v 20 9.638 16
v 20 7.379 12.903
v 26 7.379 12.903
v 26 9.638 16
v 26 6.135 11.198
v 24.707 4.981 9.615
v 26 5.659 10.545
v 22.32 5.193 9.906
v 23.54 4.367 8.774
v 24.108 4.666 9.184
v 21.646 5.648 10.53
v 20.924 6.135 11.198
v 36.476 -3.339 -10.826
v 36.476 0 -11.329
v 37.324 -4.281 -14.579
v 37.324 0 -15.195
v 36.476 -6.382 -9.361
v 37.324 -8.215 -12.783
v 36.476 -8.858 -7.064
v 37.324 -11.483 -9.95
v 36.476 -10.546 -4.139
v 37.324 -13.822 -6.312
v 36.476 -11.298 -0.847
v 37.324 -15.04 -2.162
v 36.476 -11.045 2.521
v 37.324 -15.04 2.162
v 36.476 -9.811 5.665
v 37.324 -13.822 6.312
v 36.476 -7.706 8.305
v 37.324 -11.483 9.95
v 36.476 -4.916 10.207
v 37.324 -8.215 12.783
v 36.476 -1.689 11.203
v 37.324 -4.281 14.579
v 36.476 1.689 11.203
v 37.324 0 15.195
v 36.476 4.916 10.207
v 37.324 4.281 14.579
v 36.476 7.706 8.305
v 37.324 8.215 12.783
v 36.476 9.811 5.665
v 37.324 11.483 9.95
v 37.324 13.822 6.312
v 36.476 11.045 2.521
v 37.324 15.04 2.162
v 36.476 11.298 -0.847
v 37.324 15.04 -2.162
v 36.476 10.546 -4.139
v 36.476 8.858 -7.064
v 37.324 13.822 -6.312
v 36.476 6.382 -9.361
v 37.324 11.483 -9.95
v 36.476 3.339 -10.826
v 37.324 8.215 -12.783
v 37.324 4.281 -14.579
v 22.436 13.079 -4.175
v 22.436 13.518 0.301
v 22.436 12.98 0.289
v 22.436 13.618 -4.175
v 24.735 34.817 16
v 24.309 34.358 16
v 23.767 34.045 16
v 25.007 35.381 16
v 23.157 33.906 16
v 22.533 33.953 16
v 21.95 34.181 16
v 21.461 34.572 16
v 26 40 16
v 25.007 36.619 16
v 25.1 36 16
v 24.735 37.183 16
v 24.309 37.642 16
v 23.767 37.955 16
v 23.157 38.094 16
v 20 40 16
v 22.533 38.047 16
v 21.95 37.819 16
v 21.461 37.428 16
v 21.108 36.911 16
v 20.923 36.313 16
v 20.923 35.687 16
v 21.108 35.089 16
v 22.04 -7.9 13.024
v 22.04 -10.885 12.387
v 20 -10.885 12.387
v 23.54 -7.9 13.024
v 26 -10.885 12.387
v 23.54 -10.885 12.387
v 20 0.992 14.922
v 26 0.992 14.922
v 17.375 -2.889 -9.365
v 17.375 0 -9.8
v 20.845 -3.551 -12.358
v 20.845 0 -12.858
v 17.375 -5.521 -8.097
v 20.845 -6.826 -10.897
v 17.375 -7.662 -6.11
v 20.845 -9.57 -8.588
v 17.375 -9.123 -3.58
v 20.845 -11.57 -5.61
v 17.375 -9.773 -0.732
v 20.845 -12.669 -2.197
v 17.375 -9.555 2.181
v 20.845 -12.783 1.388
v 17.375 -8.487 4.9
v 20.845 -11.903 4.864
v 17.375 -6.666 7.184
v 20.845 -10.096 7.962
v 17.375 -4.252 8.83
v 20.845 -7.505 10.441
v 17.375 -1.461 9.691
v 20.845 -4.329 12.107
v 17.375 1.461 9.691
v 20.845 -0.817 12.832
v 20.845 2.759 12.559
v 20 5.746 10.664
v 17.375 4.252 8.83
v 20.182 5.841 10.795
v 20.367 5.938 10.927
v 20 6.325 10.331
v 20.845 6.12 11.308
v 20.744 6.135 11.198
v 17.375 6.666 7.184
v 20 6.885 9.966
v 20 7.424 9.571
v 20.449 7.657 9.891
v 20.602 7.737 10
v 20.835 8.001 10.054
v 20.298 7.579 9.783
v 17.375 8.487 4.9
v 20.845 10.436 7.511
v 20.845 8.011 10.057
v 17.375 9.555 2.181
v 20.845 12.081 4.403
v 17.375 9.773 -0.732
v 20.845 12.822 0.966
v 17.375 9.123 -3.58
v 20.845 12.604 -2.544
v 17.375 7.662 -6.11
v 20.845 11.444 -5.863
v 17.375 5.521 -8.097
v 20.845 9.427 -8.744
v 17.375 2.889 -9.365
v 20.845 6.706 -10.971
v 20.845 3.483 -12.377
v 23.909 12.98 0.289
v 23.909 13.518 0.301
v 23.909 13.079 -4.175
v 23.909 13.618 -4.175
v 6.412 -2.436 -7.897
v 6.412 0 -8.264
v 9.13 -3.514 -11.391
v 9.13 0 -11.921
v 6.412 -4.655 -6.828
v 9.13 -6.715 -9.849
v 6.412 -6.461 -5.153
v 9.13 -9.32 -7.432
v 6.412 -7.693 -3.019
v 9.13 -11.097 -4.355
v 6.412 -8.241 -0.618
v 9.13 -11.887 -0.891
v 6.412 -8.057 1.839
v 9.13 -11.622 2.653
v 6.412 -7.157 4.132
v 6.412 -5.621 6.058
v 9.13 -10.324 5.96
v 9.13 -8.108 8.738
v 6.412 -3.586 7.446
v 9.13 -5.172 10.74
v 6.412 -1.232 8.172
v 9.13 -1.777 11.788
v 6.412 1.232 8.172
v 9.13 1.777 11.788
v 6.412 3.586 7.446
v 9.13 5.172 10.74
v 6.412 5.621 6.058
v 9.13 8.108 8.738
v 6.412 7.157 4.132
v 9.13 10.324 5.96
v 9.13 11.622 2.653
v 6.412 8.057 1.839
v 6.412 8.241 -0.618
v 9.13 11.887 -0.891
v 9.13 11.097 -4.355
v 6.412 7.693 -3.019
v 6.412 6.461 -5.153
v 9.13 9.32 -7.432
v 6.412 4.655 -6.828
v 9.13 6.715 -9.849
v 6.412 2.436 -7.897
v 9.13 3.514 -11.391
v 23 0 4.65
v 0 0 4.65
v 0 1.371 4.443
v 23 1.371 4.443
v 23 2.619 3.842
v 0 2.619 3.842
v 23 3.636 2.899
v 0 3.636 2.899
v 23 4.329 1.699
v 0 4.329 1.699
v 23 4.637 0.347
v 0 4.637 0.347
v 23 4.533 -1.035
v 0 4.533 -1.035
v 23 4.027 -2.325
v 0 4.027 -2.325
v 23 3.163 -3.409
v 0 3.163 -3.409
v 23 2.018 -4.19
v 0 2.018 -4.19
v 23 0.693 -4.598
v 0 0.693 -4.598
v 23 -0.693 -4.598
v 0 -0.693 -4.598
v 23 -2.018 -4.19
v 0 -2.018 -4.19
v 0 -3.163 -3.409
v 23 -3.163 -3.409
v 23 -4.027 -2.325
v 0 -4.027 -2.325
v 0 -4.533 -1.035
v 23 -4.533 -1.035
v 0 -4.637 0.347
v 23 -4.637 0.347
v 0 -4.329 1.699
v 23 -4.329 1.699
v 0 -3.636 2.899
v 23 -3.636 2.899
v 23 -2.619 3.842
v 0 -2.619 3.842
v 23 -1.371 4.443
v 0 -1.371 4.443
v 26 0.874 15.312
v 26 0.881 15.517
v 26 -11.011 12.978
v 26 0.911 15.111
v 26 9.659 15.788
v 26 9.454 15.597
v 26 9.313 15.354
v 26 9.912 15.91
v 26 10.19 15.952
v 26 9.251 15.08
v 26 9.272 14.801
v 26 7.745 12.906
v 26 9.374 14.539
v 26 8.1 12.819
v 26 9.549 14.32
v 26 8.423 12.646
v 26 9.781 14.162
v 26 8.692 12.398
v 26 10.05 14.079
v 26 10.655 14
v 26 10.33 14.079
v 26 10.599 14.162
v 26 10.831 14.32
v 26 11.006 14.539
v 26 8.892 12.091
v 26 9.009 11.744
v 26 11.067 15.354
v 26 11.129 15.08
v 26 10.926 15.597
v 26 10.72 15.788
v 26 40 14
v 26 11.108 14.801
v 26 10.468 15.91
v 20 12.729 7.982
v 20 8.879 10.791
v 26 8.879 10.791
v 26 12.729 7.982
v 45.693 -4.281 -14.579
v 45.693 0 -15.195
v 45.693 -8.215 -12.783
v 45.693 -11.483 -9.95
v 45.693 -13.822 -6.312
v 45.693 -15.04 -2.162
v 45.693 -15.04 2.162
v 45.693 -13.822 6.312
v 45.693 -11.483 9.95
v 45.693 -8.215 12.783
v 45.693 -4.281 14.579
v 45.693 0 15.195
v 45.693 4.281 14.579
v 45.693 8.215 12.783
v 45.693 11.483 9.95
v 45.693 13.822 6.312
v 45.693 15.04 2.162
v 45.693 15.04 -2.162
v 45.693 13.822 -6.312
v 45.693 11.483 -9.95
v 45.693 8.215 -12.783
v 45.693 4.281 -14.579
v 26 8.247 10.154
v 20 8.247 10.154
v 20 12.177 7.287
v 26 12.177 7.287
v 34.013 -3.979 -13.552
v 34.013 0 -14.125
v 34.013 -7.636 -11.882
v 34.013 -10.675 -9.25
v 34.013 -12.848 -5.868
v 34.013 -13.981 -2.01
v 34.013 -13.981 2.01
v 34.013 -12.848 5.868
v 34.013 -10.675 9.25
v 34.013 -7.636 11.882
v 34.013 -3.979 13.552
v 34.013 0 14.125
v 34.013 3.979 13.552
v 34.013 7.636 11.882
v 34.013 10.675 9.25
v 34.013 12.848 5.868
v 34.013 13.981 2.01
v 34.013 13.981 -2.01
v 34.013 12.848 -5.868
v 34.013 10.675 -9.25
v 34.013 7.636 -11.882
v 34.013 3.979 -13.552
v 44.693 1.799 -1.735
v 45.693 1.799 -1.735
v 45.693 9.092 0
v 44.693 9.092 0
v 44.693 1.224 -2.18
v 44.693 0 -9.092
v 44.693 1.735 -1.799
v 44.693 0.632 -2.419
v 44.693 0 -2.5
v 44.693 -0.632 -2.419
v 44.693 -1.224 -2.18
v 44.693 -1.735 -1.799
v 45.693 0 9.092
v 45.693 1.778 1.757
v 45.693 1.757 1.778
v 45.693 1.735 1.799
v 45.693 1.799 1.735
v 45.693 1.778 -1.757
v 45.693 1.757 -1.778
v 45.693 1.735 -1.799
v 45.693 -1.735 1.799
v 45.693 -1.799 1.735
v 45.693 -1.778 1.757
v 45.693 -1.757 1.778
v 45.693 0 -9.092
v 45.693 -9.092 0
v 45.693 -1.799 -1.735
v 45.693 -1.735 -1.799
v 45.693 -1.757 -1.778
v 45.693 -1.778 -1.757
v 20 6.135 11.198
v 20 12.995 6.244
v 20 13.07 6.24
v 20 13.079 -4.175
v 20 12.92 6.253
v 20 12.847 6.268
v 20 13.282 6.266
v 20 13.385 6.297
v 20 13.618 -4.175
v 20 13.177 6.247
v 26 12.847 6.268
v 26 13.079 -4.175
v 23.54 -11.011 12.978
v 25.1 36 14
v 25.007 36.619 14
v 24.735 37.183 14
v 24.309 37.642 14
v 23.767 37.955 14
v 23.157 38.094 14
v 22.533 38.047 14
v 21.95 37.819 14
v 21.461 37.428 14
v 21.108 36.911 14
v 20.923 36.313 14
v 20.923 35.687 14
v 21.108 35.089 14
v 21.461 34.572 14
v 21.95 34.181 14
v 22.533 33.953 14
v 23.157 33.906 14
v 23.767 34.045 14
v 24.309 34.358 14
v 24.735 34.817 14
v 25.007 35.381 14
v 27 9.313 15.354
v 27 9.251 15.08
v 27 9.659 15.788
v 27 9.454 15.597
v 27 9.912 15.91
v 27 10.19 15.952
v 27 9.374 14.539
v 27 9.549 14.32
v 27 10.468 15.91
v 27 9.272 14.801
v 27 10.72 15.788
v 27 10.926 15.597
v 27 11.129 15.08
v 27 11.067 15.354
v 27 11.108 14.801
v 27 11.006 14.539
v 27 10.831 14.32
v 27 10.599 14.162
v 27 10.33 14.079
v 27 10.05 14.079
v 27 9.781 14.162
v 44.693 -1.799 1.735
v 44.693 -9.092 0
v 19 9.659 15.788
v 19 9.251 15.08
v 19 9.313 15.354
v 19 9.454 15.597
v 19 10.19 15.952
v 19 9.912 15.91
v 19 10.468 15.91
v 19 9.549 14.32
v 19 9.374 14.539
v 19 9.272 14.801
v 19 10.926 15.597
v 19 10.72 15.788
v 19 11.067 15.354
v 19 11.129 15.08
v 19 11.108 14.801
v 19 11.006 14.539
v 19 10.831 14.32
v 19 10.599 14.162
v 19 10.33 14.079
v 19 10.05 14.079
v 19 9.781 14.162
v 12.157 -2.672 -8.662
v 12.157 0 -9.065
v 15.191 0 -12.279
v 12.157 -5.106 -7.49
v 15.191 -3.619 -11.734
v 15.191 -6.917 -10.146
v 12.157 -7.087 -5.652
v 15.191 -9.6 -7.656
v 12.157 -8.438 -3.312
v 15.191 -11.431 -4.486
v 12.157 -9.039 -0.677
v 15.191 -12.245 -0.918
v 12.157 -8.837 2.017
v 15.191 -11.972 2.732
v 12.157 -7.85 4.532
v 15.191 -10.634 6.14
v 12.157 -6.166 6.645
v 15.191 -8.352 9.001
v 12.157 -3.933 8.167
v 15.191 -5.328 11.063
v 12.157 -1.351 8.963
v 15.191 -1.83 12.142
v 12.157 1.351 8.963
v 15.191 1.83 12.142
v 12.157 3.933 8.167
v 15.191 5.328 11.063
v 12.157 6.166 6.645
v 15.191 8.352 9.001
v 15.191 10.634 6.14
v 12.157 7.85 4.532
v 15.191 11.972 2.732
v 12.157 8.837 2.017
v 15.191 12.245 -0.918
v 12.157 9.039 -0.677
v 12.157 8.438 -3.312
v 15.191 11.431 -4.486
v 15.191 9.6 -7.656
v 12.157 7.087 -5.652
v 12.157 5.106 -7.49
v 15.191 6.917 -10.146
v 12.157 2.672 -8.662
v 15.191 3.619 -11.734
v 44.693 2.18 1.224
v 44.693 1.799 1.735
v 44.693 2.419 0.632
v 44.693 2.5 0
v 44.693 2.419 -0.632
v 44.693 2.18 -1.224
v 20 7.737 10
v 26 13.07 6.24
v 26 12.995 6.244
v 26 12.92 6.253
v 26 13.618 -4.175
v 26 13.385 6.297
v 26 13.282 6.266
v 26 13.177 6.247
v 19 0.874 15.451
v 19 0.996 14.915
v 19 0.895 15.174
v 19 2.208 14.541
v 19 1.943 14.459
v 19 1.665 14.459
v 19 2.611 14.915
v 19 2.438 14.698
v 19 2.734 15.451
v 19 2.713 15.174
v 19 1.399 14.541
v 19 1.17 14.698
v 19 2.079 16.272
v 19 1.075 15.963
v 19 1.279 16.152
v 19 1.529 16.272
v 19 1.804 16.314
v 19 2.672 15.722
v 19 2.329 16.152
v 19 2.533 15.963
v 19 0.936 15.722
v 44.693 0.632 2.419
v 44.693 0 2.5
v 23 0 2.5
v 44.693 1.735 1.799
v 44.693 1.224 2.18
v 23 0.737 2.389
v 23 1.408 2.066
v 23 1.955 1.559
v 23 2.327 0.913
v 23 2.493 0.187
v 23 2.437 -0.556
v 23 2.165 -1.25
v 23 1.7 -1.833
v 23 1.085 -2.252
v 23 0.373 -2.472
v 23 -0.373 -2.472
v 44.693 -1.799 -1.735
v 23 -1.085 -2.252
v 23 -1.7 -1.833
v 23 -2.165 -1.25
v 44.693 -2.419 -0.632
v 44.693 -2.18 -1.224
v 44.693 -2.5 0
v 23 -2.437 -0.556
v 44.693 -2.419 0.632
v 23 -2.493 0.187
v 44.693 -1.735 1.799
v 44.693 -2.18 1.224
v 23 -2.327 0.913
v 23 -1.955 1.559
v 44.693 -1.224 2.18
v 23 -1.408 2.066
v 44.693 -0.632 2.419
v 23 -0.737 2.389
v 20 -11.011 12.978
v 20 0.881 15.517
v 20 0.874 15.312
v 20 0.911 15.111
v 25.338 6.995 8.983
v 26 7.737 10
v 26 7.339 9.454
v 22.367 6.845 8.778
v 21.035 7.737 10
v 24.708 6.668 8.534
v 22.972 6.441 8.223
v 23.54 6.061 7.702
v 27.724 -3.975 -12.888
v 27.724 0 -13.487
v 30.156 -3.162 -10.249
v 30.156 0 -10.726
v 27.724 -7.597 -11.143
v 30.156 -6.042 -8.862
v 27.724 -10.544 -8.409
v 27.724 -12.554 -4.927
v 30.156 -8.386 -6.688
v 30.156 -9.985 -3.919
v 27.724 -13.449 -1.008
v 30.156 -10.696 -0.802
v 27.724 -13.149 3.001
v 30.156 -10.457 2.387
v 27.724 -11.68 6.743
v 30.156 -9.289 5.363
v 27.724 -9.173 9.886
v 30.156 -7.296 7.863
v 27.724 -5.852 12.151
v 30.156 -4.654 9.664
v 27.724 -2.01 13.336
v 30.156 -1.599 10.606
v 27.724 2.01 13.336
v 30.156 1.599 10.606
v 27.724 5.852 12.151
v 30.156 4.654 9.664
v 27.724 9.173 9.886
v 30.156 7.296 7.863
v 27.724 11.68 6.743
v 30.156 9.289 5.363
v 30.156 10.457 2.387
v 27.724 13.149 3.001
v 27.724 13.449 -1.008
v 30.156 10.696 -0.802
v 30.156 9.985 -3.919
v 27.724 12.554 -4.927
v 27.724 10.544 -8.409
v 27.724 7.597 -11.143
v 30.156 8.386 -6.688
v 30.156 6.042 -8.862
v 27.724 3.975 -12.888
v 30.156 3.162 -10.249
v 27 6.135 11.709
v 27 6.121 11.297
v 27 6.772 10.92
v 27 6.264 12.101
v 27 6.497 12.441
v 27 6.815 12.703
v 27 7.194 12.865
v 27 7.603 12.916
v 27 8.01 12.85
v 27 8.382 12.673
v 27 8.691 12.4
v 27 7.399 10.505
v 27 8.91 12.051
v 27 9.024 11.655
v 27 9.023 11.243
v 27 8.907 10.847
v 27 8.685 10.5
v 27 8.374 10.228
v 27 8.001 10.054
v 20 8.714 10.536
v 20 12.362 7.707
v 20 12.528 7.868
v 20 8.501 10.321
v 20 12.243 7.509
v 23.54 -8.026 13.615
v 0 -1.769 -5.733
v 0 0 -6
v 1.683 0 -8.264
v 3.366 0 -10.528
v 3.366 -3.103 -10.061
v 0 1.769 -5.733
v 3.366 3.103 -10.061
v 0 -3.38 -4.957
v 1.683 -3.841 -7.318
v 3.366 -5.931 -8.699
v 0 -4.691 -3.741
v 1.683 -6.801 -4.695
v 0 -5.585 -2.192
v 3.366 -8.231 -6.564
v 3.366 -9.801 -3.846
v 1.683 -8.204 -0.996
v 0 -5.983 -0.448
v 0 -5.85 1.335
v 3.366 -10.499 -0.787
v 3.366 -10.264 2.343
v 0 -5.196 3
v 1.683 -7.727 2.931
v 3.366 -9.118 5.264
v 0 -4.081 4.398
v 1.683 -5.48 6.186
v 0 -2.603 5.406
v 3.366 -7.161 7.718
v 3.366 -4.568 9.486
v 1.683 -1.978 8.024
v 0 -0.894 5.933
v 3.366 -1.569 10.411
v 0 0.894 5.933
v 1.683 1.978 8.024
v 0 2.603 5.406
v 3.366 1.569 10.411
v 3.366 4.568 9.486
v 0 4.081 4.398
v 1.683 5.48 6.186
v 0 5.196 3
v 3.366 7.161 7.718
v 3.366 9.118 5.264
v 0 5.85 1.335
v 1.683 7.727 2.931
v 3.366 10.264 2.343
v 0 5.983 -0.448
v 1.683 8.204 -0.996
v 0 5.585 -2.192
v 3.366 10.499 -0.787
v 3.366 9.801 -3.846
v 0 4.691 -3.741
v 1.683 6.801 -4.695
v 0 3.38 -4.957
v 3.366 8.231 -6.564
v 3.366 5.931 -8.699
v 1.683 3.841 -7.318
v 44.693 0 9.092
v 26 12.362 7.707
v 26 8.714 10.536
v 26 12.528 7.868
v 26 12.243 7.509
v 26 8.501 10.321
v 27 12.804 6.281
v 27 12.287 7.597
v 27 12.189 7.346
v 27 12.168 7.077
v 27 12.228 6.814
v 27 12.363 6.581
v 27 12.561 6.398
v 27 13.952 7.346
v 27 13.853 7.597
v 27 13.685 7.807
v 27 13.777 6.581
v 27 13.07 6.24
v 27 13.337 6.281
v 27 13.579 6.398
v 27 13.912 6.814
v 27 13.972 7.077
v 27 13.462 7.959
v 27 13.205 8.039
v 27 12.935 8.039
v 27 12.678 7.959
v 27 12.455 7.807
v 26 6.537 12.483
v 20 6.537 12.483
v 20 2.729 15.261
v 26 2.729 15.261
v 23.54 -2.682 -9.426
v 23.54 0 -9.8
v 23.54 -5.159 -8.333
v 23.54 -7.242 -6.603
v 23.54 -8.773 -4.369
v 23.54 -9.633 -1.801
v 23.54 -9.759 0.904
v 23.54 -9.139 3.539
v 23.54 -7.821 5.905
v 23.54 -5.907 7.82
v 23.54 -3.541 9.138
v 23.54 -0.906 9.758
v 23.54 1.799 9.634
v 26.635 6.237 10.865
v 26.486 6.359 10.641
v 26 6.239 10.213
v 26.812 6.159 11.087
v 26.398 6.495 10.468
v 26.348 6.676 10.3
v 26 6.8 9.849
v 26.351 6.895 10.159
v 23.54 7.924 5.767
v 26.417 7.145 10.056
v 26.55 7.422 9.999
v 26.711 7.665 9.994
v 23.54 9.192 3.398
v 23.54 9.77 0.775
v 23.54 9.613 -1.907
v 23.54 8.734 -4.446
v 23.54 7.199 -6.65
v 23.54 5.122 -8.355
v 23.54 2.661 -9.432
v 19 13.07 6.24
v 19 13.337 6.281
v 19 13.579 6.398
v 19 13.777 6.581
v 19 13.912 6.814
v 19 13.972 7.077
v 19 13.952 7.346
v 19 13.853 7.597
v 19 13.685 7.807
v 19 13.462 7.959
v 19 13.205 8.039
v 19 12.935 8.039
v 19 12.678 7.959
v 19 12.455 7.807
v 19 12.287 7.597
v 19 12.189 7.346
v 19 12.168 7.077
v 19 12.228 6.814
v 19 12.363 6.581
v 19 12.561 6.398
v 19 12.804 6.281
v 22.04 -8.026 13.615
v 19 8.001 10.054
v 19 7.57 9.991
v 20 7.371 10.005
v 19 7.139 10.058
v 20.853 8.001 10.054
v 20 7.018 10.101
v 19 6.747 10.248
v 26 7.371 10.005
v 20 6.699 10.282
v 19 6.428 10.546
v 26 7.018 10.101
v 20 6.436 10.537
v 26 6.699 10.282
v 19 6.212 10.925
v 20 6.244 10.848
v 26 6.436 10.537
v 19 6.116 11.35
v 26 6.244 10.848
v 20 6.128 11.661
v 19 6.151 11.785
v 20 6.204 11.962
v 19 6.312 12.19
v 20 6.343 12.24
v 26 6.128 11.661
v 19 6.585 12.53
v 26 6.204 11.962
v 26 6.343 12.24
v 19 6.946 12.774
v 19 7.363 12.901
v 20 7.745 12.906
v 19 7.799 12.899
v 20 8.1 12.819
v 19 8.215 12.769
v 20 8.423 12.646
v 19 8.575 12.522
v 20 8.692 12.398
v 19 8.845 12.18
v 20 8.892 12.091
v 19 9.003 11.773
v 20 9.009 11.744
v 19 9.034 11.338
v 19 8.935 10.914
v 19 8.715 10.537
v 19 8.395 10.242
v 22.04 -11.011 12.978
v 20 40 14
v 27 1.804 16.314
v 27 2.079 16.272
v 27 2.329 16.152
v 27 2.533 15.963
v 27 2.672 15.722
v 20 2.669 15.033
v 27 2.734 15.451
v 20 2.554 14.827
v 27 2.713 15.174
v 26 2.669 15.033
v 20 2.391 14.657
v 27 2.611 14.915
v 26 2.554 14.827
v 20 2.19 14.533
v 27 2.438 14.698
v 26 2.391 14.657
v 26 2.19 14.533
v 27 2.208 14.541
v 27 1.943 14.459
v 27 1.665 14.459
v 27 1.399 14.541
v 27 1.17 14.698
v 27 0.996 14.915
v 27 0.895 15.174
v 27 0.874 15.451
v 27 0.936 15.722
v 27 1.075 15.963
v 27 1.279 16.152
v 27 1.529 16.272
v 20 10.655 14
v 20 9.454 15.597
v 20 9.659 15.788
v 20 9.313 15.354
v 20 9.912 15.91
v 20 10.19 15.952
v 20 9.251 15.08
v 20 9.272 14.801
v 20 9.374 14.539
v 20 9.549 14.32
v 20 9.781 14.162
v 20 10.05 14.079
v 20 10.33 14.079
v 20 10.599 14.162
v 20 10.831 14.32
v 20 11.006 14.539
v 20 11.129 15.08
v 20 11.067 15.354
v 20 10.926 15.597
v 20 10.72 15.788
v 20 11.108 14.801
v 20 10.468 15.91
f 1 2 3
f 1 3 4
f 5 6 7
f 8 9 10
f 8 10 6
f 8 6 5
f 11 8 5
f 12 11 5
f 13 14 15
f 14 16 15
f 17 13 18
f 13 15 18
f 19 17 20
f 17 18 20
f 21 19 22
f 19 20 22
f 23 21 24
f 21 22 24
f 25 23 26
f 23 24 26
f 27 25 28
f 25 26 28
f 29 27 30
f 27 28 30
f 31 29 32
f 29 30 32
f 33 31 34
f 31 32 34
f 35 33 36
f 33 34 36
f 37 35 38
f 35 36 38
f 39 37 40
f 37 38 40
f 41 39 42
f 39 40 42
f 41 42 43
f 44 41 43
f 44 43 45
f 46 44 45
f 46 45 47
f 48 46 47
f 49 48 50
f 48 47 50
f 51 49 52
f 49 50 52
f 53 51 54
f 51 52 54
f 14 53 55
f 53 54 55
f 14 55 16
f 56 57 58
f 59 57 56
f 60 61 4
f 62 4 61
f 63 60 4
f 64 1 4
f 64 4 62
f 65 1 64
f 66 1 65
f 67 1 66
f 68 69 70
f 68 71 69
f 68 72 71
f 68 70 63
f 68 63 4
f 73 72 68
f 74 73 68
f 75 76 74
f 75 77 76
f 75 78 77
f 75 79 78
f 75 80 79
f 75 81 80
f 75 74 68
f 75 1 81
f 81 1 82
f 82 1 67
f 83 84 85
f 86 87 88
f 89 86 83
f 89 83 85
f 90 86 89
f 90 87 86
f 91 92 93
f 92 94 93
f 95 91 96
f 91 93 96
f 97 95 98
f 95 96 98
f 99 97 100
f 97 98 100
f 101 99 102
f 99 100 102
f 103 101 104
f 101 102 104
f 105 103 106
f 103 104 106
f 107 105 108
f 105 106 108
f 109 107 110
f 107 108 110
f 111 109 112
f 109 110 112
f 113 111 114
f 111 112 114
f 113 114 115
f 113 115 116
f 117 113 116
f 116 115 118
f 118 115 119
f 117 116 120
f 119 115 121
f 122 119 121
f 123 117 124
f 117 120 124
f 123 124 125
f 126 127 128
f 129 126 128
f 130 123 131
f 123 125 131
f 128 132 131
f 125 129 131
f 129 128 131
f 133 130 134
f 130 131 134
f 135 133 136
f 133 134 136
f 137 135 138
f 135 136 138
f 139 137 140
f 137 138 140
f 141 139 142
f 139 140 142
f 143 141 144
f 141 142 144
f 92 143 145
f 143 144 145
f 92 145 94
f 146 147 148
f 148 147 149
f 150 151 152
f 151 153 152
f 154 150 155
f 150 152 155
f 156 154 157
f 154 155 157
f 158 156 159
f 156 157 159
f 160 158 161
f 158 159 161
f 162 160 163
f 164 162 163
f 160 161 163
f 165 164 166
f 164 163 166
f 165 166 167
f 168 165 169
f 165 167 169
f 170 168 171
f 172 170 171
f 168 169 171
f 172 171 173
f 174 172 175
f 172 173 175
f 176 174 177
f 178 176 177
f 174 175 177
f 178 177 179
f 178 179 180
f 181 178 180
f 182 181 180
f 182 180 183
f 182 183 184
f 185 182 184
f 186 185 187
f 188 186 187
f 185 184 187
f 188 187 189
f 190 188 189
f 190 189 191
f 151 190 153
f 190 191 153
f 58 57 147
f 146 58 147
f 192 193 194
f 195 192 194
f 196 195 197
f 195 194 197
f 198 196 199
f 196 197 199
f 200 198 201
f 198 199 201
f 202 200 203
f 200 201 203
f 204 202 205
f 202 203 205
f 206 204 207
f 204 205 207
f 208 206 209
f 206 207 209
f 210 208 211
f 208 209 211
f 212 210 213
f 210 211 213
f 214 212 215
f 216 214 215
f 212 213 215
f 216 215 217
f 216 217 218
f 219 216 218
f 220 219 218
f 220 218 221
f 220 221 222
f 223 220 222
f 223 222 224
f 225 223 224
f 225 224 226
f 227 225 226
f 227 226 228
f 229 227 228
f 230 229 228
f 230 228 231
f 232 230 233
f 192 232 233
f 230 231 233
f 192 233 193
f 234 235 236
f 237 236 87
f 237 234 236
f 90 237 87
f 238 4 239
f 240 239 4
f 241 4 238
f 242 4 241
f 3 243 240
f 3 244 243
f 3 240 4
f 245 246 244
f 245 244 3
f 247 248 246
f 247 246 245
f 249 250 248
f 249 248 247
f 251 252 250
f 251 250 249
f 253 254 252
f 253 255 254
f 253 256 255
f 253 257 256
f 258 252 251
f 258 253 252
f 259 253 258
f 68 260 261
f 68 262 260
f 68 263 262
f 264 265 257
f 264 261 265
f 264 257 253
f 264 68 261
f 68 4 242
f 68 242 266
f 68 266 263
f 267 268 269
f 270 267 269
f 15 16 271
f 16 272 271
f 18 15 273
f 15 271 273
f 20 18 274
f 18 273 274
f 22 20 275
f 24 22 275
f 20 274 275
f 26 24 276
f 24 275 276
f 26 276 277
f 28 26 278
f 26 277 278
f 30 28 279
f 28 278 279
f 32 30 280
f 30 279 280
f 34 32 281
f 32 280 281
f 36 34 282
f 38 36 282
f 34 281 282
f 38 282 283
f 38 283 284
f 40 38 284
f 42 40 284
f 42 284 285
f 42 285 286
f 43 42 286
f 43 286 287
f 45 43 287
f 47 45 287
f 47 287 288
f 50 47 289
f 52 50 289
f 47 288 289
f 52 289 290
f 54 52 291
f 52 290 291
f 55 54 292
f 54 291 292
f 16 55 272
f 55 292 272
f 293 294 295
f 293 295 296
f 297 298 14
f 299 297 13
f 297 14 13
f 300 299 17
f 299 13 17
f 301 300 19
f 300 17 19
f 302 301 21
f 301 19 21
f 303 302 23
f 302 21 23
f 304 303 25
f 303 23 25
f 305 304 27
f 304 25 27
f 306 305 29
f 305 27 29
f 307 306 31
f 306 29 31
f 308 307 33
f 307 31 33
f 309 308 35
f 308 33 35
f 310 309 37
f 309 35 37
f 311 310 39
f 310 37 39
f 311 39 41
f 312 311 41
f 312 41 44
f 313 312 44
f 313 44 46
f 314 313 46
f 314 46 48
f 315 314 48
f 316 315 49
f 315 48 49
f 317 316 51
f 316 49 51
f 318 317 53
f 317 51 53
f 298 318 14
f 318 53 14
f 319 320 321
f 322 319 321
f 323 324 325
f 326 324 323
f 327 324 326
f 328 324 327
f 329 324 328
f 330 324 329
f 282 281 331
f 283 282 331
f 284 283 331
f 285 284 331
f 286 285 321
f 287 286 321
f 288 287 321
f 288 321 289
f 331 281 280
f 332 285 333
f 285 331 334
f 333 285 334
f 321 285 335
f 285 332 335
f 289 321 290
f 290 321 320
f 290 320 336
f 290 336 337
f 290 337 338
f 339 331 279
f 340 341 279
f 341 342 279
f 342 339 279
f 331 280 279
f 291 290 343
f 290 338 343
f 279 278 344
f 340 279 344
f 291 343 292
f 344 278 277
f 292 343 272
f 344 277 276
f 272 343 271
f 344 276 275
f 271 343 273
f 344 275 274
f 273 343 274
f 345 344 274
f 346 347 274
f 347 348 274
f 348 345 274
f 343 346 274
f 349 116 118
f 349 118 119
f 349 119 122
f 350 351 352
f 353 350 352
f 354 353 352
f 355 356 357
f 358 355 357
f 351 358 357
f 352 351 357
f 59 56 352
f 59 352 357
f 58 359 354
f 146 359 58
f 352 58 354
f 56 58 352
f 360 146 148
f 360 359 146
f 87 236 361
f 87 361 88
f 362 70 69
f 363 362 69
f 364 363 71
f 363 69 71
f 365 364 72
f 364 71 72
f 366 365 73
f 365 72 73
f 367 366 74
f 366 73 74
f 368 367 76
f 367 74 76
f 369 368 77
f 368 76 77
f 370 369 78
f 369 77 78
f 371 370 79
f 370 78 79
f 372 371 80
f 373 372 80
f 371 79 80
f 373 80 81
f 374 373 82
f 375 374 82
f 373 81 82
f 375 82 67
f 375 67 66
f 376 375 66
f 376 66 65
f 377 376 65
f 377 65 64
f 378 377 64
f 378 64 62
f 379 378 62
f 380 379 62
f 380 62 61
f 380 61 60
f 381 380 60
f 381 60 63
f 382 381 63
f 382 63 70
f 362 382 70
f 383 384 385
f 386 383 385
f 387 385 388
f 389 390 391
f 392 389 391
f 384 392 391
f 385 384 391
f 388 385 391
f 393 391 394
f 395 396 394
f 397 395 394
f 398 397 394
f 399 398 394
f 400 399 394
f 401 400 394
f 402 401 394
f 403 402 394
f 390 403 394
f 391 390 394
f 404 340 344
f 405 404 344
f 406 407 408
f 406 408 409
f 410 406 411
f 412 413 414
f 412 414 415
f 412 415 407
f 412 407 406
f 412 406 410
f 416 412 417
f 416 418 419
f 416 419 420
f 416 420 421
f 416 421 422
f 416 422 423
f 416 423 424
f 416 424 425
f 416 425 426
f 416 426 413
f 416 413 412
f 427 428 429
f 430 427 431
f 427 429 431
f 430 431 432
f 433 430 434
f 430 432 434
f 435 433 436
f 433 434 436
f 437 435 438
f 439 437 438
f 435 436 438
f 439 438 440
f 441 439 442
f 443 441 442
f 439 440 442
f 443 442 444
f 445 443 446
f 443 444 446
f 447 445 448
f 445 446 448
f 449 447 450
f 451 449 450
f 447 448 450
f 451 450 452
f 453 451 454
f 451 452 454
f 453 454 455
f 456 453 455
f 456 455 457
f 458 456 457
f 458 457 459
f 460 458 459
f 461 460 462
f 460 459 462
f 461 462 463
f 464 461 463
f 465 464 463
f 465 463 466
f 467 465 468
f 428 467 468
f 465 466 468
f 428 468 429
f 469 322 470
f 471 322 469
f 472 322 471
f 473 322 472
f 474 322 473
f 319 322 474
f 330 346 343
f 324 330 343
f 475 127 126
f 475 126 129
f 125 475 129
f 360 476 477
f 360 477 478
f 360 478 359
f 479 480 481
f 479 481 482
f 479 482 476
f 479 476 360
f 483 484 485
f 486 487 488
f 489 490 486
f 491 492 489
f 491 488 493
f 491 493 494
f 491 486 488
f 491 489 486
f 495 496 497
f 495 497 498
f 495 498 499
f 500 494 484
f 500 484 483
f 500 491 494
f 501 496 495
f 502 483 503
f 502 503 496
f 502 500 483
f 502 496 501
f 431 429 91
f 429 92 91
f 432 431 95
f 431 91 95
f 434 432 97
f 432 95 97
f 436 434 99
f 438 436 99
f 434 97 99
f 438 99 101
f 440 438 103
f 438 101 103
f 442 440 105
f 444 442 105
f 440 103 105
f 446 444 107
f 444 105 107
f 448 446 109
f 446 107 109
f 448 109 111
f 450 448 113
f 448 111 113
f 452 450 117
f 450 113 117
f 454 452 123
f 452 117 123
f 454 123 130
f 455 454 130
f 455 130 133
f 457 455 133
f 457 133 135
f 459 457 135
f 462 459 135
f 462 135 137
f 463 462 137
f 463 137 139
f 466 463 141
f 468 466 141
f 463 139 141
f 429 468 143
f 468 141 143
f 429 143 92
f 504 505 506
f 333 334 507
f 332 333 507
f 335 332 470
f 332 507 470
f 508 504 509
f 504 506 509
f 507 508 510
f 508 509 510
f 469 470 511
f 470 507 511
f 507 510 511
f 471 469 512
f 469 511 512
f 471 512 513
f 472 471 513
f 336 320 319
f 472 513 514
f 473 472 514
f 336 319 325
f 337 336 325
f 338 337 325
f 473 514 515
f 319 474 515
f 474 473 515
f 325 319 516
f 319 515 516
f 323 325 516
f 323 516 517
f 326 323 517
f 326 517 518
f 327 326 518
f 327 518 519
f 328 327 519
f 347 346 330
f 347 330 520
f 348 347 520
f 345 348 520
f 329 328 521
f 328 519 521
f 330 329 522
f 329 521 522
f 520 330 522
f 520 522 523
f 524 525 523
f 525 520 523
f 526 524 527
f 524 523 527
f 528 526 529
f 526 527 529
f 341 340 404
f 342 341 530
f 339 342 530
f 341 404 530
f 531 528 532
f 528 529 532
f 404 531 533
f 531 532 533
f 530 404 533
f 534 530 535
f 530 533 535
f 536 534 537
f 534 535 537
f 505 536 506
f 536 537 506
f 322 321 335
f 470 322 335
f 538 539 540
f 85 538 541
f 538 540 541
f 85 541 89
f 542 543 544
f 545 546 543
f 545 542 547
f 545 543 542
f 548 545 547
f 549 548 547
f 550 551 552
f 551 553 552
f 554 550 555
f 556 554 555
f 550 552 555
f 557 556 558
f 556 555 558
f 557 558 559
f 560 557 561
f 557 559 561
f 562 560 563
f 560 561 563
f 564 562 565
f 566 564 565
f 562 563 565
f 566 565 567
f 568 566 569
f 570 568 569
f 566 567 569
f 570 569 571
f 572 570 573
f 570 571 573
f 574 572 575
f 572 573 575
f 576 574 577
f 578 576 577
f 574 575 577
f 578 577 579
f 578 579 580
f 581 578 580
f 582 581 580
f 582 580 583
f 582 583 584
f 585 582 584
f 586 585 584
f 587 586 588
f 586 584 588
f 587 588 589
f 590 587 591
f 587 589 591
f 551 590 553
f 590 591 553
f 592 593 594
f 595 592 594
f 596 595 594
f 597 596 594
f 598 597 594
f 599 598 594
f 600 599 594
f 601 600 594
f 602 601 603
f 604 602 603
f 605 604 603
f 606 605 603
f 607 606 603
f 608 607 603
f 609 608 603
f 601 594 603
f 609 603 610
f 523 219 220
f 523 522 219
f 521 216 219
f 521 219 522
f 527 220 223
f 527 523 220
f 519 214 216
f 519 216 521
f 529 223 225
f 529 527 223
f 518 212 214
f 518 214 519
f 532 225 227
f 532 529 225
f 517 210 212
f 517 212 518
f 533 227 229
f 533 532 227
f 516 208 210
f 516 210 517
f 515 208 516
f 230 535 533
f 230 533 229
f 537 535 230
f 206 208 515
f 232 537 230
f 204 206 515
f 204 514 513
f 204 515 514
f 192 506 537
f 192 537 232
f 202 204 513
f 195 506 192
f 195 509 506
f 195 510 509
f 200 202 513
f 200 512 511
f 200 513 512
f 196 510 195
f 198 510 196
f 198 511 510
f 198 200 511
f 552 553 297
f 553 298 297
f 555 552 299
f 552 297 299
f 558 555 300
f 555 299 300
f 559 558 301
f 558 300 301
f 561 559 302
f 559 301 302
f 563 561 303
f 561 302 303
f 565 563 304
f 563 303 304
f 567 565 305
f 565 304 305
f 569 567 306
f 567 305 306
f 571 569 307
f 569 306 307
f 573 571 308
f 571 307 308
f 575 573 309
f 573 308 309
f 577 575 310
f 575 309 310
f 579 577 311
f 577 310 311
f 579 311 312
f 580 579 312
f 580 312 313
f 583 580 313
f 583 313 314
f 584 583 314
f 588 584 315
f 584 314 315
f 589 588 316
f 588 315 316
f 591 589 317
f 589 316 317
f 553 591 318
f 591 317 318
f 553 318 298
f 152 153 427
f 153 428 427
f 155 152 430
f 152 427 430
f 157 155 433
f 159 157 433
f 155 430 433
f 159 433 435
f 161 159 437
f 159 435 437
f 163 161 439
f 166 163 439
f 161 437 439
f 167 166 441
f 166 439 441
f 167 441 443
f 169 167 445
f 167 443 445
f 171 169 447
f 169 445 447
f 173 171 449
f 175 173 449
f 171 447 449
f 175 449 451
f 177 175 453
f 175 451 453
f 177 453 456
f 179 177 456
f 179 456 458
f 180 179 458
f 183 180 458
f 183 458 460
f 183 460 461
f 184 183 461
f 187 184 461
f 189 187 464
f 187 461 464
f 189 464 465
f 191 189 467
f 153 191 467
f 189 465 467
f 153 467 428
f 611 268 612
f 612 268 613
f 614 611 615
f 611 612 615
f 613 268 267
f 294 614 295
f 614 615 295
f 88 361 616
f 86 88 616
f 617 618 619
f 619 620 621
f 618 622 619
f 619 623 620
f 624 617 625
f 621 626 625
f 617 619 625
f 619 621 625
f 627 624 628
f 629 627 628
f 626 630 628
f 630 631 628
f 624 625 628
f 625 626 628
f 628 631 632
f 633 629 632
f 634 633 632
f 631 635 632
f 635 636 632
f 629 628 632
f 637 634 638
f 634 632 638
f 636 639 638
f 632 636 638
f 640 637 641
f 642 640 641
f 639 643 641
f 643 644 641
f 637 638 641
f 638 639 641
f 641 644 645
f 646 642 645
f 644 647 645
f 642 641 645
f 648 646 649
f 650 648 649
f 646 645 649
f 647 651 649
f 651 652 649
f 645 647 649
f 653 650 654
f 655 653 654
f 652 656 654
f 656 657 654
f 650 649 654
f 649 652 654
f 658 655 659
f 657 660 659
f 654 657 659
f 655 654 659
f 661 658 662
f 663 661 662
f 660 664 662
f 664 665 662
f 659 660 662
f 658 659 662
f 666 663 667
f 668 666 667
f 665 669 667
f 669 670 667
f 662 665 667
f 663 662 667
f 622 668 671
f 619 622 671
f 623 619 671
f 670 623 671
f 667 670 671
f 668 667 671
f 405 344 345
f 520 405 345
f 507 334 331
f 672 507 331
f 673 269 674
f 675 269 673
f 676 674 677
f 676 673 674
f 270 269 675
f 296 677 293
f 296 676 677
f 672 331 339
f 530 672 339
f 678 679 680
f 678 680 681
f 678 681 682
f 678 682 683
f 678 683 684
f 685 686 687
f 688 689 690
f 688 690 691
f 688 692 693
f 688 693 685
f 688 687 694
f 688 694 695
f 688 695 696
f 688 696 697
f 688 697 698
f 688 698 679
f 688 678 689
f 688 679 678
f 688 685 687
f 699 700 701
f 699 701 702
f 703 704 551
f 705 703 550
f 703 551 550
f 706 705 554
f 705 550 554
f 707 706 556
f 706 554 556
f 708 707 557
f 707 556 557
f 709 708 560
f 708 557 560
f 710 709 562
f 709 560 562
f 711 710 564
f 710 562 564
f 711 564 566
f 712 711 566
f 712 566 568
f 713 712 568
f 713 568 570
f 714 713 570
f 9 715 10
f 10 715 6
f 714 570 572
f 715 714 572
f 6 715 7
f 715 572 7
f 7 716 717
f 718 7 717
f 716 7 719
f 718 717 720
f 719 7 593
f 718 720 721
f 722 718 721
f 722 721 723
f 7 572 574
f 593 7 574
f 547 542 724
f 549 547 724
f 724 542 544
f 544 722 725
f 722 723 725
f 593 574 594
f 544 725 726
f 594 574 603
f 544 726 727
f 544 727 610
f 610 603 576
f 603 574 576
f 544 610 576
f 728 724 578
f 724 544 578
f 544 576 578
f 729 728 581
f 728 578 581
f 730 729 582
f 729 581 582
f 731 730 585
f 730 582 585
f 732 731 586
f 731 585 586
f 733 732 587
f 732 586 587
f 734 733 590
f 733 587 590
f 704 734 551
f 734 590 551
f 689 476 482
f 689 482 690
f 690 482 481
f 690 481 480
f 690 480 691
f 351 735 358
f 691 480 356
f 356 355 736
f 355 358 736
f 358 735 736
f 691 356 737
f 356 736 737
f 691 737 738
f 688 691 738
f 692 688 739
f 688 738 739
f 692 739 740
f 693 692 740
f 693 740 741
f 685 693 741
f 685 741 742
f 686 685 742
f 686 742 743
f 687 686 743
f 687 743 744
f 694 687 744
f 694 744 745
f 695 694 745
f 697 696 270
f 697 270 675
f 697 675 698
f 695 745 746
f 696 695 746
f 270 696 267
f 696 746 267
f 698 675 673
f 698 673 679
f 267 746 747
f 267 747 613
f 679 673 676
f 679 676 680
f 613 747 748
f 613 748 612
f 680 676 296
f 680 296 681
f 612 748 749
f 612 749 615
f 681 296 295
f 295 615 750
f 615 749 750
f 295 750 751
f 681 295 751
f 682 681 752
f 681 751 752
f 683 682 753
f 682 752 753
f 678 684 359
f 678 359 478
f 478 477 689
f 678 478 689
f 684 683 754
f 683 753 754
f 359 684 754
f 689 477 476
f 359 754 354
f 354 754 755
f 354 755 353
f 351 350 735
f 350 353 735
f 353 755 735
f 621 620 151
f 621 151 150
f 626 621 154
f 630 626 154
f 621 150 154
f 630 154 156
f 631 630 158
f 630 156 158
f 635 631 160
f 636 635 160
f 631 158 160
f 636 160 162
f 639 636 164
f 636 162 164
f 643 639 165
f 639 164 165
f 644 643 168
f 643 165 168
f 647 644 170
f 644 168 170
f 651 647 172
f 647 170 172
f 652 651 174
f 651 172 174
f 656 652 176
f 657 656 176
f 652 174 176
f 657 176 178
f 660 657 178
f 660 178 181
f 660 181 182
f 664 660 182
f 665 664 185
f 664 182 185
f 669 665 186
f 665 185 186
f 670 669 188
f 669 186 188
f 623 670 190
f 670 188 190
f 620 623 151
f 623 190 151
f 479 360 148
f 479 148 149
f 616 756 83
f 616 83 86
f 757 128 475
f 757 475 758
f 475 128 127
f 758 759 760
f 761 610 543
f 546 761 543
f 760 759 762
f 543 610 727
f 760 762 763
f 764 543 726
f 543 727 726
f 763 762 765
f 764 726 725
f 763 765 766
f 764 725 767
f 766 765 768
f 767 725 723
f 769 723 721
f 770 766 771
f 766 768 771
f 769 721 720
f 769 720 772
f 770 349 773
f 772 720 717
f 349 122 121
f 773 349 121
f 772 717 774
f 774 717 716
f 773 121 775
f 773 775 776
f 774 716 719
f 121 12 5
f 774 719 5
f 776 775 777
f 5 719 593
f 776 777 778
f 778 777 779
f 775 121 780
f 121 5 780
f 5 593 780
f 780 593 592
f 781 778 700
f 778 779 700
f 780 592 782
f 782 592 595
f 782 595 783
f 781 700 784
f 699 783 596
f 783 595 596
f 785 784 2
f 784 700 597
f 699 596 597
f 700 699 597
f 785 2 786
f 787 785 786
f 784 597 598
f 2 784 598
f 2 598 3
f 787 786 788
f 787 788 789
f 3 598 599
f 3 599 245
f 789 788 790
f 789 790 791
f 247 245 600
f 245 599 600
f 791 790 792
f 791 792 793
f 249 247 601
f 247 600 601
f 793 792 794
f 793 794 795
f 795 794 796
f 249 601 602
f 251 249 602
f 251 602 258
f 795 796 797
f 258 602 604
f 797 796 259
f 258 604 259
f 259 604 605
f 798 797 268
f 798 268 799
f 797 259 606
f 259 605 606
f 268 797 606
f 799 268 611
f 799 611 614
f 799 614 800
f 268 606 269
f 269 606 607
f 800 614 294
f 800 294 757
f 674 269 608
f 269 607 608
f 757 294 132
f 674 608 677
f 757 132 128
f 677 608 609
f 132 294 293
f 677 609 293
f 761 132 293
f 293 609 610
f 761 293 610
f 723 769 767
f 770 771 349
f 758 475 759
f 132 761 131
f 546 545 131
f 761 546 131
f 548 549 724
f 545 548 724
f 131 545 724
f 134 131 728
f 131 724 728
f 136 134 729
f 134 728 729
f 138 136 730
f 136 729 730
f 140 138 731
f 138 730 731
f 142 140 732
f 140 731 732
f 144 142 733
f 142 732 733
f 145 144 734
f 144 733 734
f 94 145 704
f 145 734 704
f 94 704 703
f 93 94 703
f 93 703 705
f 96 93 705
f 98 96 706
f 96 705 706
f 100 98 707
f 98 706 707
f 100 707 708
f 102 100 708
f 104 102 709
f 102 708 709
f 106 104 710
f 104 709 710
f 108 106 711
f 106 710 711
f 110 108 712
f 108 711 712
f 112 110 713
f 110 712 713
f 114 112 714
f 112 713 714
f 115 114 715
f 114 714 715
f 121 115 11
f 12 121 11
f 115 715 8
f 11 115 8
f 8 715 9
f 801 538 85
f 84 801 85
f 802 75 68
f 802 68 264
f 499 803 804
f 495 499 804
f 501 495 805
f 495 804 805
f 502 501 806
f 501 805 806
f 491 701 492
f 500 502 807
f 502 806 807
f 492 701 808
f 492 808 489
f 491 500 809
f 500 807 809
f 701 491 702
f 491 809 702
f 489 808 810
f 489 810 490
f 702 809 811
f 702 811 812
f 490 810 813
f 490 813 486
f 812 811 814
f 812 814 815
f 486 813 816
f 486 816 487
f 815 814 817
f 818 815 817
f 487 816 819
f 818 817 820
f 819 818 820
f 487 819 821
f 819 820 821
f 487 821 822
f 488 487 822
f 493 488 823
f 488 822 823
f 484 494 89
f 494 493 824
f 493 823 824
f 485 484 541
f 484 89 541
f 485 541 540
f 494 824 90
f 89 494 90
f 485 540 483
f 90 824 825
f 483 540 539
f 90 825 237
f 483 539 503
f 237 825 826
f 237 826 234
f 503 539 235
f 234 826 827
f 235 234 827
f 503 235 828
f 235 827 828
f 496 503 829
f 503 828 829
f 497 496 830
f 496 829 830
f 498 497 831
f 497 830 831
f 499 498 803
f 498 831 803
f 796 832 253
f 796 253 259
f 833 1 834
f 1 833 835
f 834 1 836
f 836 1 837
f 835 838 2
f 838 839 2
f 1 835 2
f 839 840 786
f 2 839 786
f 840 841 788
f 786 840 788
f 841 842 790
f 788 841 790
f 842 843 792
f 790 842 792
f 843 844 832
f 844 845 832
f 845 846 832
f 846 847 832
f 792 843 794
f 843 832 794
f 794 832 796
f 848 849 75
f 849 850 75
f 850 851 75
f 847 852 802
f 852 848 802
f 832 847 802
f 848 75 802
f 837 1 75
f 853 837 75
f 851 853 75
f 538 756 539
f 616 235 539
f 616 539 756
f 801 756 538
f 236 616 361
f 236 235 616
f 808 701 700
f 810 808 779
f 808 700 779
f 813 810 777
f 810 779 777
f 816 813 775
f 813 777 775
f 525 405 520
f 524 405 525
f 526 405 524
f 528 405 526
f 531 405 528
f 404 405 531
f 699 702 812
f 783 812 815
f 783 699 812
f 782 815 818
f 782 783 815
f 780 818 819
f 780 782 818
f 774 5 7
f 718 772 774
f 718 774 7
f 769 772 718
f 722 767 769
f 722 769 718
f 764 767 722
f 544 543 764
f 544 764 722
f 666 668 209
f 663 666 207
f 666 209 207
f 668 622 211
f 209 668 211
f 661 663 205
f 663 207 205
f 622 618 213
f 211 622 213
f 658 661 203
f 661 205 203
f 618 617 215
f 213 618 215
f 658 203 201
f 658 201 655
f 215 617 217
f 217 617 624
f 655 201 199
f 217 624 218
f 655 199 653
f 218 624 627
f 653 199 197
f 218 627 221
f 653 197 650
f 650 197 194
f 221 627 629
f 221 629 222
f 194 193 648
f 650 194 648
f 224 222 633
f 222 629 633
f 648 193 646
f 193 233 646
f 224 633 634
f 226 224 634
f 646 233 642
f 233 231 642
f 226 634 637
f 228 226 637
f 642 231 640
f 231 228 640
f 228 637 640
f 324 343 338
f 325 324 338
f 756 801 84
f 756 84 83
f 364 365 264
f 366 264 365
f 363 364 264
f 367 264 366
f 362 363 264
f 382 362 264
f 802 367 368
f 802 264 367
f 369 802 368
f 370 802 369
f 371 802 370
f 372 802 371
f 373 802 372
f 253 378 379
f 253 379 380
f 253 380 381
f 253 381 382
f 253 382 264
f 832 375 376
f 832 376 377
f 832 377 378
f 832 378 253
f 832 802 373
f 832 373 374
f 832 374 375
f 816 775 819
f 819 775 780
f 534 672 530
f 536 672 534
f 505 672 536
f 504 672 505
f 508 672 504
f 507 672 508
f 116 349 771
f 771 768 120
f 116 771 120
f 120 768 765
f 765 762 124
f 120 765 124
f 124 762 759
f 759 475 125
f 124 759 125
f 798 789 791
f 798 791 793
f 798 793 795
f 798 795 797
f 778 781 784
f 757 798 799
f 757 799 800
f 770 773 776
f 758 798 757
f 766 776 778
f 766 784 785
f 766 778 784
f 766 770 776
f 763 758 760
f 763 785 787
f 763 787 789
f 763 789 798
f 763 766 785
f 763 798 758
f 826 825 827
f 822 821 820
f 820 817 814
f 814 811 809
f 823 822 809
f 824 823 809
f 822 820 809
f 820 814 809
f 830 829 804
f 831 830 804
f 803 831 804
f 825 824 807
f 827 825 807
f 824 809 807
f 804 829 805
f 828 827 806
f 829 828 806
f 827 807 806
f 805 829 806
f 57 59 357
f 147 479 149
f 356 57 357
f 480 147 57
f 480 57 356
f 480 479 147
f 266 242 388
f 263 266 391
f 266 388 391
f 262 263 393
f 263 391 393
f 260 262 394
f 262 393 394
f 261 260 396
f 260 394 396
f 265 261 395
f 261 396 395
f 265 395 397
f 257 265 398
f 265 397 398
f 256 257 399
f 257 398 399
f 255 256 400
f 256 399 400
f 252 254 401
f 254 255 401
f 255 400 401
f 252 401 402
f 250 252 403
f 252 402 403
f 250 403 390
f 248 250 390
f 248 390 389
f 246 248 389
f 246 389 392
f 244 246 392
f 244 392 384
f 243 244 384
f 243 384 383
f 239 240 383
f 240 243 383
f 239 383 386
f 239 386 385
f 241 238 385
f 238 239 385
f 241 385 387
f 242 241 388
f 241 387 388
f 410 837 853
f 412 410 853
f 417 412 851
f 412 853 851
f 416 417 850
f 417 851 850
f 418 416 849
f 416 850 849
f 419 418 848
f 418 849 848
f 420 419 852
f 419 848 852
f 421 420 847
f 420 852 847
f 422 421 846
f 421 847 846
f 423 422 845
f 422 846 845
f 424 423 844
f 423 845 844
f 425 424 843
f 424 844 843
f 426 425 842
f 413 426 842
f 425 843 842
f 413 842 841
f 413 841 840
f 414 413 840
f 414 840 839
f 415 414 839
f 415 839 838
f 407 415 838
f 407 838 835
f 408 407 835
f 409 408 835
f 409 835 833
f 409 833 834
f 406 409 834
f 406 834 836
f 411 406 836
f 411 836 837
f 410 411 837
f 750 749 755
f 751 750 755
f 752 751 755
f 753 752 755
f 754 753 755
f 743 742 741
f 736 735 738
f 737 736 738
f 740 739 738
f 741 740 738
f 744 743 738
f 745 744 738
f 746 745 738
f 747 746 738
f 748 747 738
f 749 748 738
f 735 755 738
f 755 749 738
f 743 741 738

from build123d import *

# Parameters (mm, degrees)
SKIZZE3_R                             = 4.65
SCHNITT_LINEAR_AUSTRAGEN1_DEPTH       = 23
SKIZZE4_R                             = 2.5
SCHNITT_LINEAR_AUSTRAGEN2_DEPTH       = 32.476295332
AUFSATZ_LINEAR_AUSTRAGEN2_DEPTH       = 6
SKIZZE10_R                            = 2.1
SCHNITT_LINEAR_AUSTRAGEN4_DEPTH       = 6
SKIZZE13_W                            = 6
SKIZZE13_H                            = 0.905916259
AUFSATZ_LINEAR_AUSTRAGEN3_DEPTH       = 6
SKIZZE14_W                            = 6
SKIZZE14_H                            = 0.886770142
AUFSATZ_LINEAR_AUSTRAGEN4_DEPTH       = 6
AUFSATZ_LINEAR_AUSTRAGEN5_DEPTH       = 6
AUFSATZ_LINEAR_AUSTRAGEN6_DEPTH       = 6
SCHNITT_LINEAR_AUSTRAGEN5_DEPTH       = 1
KREISMUSTER1_COUNT                    = 4
AUFSATZ_LINEAR_AUSTRAGEN7_DEPTH       = 1
AUFSATZ_LINEAR_AUSTRAGEN7_DEPTH_BACK  = 7
SKIZZE24_R                            = 1.46260877
AUFSATZ_LINEAR_AUSTRAGEN8_DEPTH       = 1
AUFSATZ_LINEAR_AUSTRAGEN8_DEPTH_BACK  = 7
SKIZZE25_R                            = 0.941763398
AUFSATZ_LINEAR_AUSTRAGEN9_DEPTH       = 1
AUFSATZ_LINEAR_AUSTRAGEN9_DEPTH_BACK  = 7
SKIZZE26_R                            = 0.9041841
AUFSATZ_LINEAR_AUSTRAGEN10_DEPTH      = 1
AUFSATZ_LINEAR_AUSTRAGEN10_DEPTH_BACK = 7
SKIZZE27_R                            = 0.932524048
SKIZZE28_W                            = 1.499442475
SKIZZE28_H                            = 3.05198511
SCHNITT_LINEAR_AUSTRAGEN6_DEPTH       = 2
SKIZZE29_W                            = 1.472214026
SKIZZE29_H                            = 4.476539639
SCHNITT_LINEAR_AUSTRAGEN7_DEPTH       = 0.6


with BuildPart() as part:
    # Skizze2 → Rotation5 (revolve)
    with BuildSketch(Plane.XY, mode=Mode.PRIVATE) as rotation5_sk:
        Polygon((0, 0), (0, 6), (3.36648022, 10.528331662), (6.412062892, 8.264165831), (9.130397088, 11.920661045), (12.157026773, 9.06464462), (15.190566342, 12.27940236), (17.374944781, 9.800306185), (20.845408565, 12.858197338), (23.539774185, 9.800306185), (27.723555025, 13.486714461), (30.156102347, 10.725966298), (34.013267201, 14.124587063), (36.476289904, 11.329251761), (37.323543296, 15.194689333), (45.693256891, 15.194689333), (45.693256891, 0), (40, 0), align=None)
    revolve(rotation5_sk.sketch.rotate(Axis((45.693256891, 0, 0), (-1, 0, 0)), 90), axis=Axis((45.693256891, 0, 0), (-1, 0, 0)))

    # Skizze3 → Schnitt-Linear austragen1 (cut)
    with BuildSketch(Plane.ZY):
        Circle(SKIZZE3_R)
    extrude(amount=-SCHNITT_LINEAR_AUSTRAGEN1_DEPTH, mode=Mode.SUBTRACT)

    # Skizze4 → Schnitt-Linear austragen2 (cut, through all)
    with BuildSketch(Plane.ZY.offset(-23)):
        Circle(SKIZZE4_R)
    extrude(amount=-SCHNITT_LINEAR_AUSTRAGEN2_DEPTH, mode=Mode.SUBTRACT)

    # Skizze8 → Aufsatz-Linear austragen2 (add)
    with BuildSketch(Plane.ZY.offset(-20)):
        Polygon((5.135425827, 1.713216567), (16, 9.637964787), (16, 40), (14, 40), (14, 10.654654556), (3.956822965, 3.329043072), align=None)
    extrude(amount=-AUFSATZ_LINEAR_AUSTRAGEN2_DEPTH)

    # Skizze10 → Schnitt-Linear austragen4 (cut)
    with BuildSketch(Plane.XY.offset(16)):
        with Locations((23, 36)):
            Circle(SKIZZE10_R)
    extrude(amount=-SCHNITT_LINEAR_AUSTRAGEN4_DEPTH, mode=Mode.SUBTRACT)

    # Skizze13 → Aufsatz-Linear austragen3 (add)
    with BuildSketch(Plane(origin=(0, -1.326741748, 0.96774104), x_dir=(1, 0, 0), z_dir=(-4.115069899356744e-15, -0.8079132523298957, 0.5893014311112186))):
        with Locations((23, 13.484679747)):
            Rectangle(SKIZZE13_W, SKIZZE13_H)
    extrude(amount=AUFSATZ_LINEAR_AUSTRAGEN3_DEPTH)

    # Skizze14 → Aufsatz-Linear austragen4 (add)
    with BuildSketch(Plane(origin=(0, 0.289084756, -0.210861822), x_dir=(1, 0, 0), z_dir=(4.115069899356744e-15, 0.807913252329896, -0.5893014311112185))):
        with Locations((23, -13.507060971)):
            Rectangle(SKIZZE14_W, SKIZZE14_H)
    extrude(amount=AUFSATZ_LINEAR_AUSTRAGEN4_DEPTH)

    # Skizze16 → Aufsatz-Linear austragen5 (add)
    with BuildSketch(Plane(origin=(26, 0, 0), x_dir=(0, 0, -1), z_dir=(1, 0, 0))):
        Polygon((-15.763951974, 2.039248685), (-12.977538642, -11.010844393), (-12.386566519, -10.884661952), (-15.032050222, 1.505390937), align=None)
    extrude(amount=-AUFSATZ_LINEAR_AUSTRAGEN5_DEPTH)

    # Skizze17 → Aufsatz-Linear austragen6 (add)
    with BuildSketch(Plane(origin=(26, 0, 0), x_dir=(0, 0, -1), z_dir=(1, 0, 0))):
        Polygon((-6.807646475, 12.835007174), (4.174727727, 13.079302841), (4.174727727, 13.617814342), (-7.524079824, 13.357582087), align=None)
    extrude(amount=-AUFSATZ_LINEAR_AUSTRAGEN6_DEPTH)

    # Skizze19 → Schnitt-Linear austragen5 (cut)
    with BuildSketch(Plane(origin=(45.693256891, 0, 0), x_dir=(0, 0, -1), z_dir=(1, 0, 0))):
        Polygon((-1.799469686, 1.735485191), (-9.091569519, 0), (-1.799469686, -1.735485191), (-2.158394422, -1.261480685), (-2.415859445, -0.6431354), (-2.5, 0), (-2.408587239, 0.669856338), (-2.158394422, 1.261480685), align=None)
    schnitt_linear_austragen5 = extrude(amount=-SCHNITT_LINEAR_AUSTRAGEN5_DEPTH, mode=Mode.SUBTRACT)

    # Kreismuster1: Schnitt-Linear austragen5 ×4 about axis
    kreismuster1_axis = Axis((0, 0, 0), (1, 0, 0))
    for i in range(1, KREISMUSTER1_COUNT):
        add(schnitt_linear_austragen5.rotate(kreismuster1_axis, i * 360 / KREISMUSTER1_COUNT), mode=Mode.SUBTRACT)

    # Skizze24 → Aufsatz-Linear austragen7 (add, two sides: drawn at the far end of the back side and taken through both)
    with BuildSketch(Plane.ZY.offset(-20).offset(-AUFSATZ_LINEAR_AUSTRAGEN7_DEPTH_BACK)):
        with Locations(Location((11.453507252, 7.575434524, 0), (0, 0, 163.086563891))):
            Circle(SKIZZE24_R)
    extrude(amount=AUFSATZ_LINEAR_AUSTRAGEN7_DEPTH + AUFSATZ_LINEAR_AUSTRAGEN7_DEPTH_BACK)

    # Skizze25 → Aufsatz-Linear austragen8 (add, two sides: drawn at the far end of the back side and taken through both)
    with BuildSketch(Plane.ZY.offset(-20).offset(-AUFSATZ_LINEAR_AUSTRAGEN8_DEPTH_BACK)):
        with Locations((15.010107877, 10.189967275)):
            Circle(SKIZZE25_R)
    extrude(amount=AUFSATZ_LINEAR_AUSTRAGEN8_DEPTH + AUFSATZ_LINEAR_AUSTRAGEN8_DEPTH_BACK)

    # Skizze26 → Aufsatz-Linear austragen9 (add, two sides: drawn at the far end of the back side and taken through both)
    with BuildSketch(Plane(origin=(26, 0, 0), x_dir=(0, 0, -1), z_dir=(1, 0, 0)).offset(-AUFSATZ_LINEAR_AUSTRAGEN9_DEPTH_BACK)):
        with Locations((-7.144644053, 13.070033864)):
            Circle(SKIZZE26_R)
    extrude(amount=AUFSATZ_LINEAR_AUSTRAGEN9_DEPTH + AUFSATZ_LINEAR_AUSTRAGEN9_DEPTH_BACK)

    # Skizze27 → Aufsatz-Linear austragen10 (add, two sides: drawn at the far end of the back side and taken through both)
    with BuildSketch(Plane.ZY.offset(-20).offset(-AUFSATZ_LINEAR_AUSTRAGEN10_DEPTH_BACK)):
        with Locations((15.381369531, 1.80386132)):
            Circle(SKIZZE27_R)
    extrude(amount=AUFSATZ_LINEAR_AUSTRAGEN10_DEPTH + AUFSATZ_LINEAR_AUSTRAGEN10_DEPTH_BACK)

    # Skizze28 → Schnitt-Linear austragen6 (cut)
    with BuildSketch(Plane(origin=(0, -3.130195775, 14.660189045), x_dir=(1, 0, 0), z_dir=(-6.370898410720916e-15, -0.20881002467257814, 0.9779562227401783))):
        with Locations((22.790052948, -6.532291073)):
            Rectangle(SKIZZE28_W, SKIZZE28_H)
    extrude(amount=-SCHNITT_LINEAR_AUSTRAGEN6_DEPTH, mode=Mode.SUBTRACT)

    # Skizze29 → Schnitt-Linear austragen7 (cut)
    with BuildSketch(Plane(origin=(0, 13.518261299, 0.300704803), x_dir=(1, 0, 0), z_dir=(0, 0.9997526864415556, 0.022238838838681812))):
        with Locations((23.172580504, 2.23826982)):
            Rectangle(SKIZZE29_W, SKIZZE29_H)
    extrude(amount=-SCHNITT_LINEAR_AUSTRAGEN7_DEPTH, mode=Mode.SUBTRACT)


solid = part.part
